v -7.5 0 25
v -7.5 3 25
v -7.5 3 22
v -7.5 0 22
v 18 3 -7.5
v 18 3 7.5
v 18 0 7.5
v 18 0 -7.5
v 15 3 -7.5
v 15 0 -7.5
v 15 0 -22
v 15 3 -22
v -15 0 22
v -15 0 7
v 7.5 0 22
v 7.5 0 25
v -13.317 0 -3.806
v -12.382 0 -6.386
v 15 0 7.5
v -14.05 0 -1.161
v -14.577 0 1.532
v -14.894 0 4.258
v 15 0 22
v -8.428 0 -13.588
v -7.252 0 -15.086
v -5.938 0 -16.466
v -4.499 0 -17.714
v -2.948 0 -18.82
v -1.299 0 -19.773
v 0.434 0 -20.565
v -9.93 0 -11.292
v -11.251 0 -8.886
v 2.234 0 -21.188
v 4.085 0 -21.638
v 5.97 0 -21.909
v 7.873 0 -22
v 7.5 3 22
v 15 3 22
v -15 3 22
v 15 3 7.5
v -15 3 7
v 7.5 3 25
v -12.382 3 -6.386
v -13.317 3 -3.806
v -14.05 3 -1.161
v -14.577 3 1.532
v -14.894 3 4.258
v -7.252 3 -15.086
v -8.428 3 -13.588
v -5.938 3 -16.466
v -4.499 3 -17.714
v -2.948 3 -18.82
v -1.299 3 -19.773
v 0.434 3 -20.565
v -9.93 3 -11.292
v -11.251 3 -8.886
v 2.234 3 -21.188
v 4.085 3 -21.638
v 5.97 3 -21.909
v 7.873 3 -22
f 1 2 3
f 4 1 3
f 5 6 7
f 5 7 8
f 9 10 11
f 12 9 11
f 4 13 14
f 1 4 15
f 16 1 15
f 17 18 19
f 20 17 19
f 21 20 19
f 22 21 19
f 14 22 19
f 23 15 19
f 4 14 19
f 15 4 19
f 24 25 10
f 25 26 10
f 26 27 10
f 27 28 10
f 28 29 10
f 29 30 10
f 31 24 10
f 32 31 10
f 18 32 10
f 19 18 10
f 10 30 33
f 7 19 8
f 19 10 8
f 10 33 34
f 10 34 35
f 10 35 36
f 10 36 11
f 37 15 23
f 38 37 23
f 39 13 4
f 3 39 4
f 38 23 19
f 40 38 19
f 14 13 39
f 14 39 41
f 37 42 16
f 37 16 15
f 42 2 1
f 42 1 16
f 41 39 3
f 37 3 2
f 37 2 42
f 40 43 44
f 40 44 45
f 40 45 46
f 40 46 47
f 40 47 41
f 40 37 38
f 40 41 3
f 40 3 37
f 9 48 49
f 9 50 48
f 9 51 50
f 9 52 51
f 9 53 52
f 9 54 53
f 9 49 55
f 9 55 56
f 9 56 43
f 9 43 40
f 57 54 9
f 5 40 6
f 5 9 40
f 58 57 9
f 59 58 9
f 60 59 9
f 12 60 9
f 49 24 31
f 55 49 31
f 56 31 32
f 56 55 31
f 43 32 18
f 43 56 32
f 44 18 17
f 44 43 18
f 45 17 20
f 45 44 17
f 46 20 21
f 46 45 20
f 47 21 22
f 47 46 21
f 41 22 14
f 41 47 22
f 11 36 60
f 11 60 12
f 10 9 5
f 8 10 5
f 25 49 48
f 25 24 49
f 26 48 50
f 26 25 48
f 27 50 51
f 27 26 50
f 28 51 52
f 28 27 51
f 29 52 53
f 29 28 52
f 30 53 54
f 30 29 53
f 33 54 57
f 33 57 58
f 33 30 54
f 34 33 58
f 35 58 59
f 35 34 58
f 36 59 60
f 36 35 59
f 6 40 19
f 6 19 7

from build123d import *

# Parameters (mm, degrees)
SKETCH1_W           = 30
SKETCH1_H           = 44
BOSS_EXTRUDE1_DEPTH = 3
CUT_EXTRUDE1_DEPTH  = 27.795522014
SKETCH3_W           = 15
SKETCH3_H           = 3
SKETCH3_W_2         = 3
SKETCH3_H_2         = 15
BOSS_EXTRUDE2_DEPTH = 3
FILLET1_R           = 20


with BuildPart() as part:
    # Sketch1 → Boss-Extrude1 (new body)
    with BuildSketch(Plane(origin=(0, 0, 0), x_dir=(1, 0, 0), z_dir=(0, 1, 0))):
        Rectangle(SKETCH1_W, SKETCH1_H)
    extrude(amount=BOSS_EXTRUDE1_DEPTH)

    # Sketch2 → Cut-Extrude1 (cut, through all)
    with BuildSketch(Plane(origin=(0, 3, 0), x_dir=(1, 0, 0), z_dir=(0, 1, 0))):
        with BuildLine():
            Line((-15, -7), (-15, 22))
            Line((-15, 22), (0, 22))
            ThreePointArc((0, 22), (-11.028000253, 9.324827717), (-15, -7))
        make_face()
    extrude(amount=-CUT_EXTRUDE1_DEPTH, mode=Mode.SUBTRACT)

    # Sketch3 → Boss-Extrude2 (add)
    with BuildSketch(Plane(origin=(0, 3, 0), x_dir=(1, 0, 0), z_dir=(0, 1, 0))):
        with Locations((0, -23.5)):
            Rectangle(SKETCH3_W, SKETCH3_H)
        with Locations((16.5, 0)):
            Rectangle(SKETCH3_W_2, SKETCH3_H_2)
    extrude(amount=-BOSS_EXTRUDE2_DEPTH)

    # Fillet1
    fillet1_edges = [part.edges().sort_by_distance(p)[0] for p in [
        (0, 1.5, -22),
    ]]
    fillet(fillet1_edges, radius=FILLET1_R)


solid = part.part
